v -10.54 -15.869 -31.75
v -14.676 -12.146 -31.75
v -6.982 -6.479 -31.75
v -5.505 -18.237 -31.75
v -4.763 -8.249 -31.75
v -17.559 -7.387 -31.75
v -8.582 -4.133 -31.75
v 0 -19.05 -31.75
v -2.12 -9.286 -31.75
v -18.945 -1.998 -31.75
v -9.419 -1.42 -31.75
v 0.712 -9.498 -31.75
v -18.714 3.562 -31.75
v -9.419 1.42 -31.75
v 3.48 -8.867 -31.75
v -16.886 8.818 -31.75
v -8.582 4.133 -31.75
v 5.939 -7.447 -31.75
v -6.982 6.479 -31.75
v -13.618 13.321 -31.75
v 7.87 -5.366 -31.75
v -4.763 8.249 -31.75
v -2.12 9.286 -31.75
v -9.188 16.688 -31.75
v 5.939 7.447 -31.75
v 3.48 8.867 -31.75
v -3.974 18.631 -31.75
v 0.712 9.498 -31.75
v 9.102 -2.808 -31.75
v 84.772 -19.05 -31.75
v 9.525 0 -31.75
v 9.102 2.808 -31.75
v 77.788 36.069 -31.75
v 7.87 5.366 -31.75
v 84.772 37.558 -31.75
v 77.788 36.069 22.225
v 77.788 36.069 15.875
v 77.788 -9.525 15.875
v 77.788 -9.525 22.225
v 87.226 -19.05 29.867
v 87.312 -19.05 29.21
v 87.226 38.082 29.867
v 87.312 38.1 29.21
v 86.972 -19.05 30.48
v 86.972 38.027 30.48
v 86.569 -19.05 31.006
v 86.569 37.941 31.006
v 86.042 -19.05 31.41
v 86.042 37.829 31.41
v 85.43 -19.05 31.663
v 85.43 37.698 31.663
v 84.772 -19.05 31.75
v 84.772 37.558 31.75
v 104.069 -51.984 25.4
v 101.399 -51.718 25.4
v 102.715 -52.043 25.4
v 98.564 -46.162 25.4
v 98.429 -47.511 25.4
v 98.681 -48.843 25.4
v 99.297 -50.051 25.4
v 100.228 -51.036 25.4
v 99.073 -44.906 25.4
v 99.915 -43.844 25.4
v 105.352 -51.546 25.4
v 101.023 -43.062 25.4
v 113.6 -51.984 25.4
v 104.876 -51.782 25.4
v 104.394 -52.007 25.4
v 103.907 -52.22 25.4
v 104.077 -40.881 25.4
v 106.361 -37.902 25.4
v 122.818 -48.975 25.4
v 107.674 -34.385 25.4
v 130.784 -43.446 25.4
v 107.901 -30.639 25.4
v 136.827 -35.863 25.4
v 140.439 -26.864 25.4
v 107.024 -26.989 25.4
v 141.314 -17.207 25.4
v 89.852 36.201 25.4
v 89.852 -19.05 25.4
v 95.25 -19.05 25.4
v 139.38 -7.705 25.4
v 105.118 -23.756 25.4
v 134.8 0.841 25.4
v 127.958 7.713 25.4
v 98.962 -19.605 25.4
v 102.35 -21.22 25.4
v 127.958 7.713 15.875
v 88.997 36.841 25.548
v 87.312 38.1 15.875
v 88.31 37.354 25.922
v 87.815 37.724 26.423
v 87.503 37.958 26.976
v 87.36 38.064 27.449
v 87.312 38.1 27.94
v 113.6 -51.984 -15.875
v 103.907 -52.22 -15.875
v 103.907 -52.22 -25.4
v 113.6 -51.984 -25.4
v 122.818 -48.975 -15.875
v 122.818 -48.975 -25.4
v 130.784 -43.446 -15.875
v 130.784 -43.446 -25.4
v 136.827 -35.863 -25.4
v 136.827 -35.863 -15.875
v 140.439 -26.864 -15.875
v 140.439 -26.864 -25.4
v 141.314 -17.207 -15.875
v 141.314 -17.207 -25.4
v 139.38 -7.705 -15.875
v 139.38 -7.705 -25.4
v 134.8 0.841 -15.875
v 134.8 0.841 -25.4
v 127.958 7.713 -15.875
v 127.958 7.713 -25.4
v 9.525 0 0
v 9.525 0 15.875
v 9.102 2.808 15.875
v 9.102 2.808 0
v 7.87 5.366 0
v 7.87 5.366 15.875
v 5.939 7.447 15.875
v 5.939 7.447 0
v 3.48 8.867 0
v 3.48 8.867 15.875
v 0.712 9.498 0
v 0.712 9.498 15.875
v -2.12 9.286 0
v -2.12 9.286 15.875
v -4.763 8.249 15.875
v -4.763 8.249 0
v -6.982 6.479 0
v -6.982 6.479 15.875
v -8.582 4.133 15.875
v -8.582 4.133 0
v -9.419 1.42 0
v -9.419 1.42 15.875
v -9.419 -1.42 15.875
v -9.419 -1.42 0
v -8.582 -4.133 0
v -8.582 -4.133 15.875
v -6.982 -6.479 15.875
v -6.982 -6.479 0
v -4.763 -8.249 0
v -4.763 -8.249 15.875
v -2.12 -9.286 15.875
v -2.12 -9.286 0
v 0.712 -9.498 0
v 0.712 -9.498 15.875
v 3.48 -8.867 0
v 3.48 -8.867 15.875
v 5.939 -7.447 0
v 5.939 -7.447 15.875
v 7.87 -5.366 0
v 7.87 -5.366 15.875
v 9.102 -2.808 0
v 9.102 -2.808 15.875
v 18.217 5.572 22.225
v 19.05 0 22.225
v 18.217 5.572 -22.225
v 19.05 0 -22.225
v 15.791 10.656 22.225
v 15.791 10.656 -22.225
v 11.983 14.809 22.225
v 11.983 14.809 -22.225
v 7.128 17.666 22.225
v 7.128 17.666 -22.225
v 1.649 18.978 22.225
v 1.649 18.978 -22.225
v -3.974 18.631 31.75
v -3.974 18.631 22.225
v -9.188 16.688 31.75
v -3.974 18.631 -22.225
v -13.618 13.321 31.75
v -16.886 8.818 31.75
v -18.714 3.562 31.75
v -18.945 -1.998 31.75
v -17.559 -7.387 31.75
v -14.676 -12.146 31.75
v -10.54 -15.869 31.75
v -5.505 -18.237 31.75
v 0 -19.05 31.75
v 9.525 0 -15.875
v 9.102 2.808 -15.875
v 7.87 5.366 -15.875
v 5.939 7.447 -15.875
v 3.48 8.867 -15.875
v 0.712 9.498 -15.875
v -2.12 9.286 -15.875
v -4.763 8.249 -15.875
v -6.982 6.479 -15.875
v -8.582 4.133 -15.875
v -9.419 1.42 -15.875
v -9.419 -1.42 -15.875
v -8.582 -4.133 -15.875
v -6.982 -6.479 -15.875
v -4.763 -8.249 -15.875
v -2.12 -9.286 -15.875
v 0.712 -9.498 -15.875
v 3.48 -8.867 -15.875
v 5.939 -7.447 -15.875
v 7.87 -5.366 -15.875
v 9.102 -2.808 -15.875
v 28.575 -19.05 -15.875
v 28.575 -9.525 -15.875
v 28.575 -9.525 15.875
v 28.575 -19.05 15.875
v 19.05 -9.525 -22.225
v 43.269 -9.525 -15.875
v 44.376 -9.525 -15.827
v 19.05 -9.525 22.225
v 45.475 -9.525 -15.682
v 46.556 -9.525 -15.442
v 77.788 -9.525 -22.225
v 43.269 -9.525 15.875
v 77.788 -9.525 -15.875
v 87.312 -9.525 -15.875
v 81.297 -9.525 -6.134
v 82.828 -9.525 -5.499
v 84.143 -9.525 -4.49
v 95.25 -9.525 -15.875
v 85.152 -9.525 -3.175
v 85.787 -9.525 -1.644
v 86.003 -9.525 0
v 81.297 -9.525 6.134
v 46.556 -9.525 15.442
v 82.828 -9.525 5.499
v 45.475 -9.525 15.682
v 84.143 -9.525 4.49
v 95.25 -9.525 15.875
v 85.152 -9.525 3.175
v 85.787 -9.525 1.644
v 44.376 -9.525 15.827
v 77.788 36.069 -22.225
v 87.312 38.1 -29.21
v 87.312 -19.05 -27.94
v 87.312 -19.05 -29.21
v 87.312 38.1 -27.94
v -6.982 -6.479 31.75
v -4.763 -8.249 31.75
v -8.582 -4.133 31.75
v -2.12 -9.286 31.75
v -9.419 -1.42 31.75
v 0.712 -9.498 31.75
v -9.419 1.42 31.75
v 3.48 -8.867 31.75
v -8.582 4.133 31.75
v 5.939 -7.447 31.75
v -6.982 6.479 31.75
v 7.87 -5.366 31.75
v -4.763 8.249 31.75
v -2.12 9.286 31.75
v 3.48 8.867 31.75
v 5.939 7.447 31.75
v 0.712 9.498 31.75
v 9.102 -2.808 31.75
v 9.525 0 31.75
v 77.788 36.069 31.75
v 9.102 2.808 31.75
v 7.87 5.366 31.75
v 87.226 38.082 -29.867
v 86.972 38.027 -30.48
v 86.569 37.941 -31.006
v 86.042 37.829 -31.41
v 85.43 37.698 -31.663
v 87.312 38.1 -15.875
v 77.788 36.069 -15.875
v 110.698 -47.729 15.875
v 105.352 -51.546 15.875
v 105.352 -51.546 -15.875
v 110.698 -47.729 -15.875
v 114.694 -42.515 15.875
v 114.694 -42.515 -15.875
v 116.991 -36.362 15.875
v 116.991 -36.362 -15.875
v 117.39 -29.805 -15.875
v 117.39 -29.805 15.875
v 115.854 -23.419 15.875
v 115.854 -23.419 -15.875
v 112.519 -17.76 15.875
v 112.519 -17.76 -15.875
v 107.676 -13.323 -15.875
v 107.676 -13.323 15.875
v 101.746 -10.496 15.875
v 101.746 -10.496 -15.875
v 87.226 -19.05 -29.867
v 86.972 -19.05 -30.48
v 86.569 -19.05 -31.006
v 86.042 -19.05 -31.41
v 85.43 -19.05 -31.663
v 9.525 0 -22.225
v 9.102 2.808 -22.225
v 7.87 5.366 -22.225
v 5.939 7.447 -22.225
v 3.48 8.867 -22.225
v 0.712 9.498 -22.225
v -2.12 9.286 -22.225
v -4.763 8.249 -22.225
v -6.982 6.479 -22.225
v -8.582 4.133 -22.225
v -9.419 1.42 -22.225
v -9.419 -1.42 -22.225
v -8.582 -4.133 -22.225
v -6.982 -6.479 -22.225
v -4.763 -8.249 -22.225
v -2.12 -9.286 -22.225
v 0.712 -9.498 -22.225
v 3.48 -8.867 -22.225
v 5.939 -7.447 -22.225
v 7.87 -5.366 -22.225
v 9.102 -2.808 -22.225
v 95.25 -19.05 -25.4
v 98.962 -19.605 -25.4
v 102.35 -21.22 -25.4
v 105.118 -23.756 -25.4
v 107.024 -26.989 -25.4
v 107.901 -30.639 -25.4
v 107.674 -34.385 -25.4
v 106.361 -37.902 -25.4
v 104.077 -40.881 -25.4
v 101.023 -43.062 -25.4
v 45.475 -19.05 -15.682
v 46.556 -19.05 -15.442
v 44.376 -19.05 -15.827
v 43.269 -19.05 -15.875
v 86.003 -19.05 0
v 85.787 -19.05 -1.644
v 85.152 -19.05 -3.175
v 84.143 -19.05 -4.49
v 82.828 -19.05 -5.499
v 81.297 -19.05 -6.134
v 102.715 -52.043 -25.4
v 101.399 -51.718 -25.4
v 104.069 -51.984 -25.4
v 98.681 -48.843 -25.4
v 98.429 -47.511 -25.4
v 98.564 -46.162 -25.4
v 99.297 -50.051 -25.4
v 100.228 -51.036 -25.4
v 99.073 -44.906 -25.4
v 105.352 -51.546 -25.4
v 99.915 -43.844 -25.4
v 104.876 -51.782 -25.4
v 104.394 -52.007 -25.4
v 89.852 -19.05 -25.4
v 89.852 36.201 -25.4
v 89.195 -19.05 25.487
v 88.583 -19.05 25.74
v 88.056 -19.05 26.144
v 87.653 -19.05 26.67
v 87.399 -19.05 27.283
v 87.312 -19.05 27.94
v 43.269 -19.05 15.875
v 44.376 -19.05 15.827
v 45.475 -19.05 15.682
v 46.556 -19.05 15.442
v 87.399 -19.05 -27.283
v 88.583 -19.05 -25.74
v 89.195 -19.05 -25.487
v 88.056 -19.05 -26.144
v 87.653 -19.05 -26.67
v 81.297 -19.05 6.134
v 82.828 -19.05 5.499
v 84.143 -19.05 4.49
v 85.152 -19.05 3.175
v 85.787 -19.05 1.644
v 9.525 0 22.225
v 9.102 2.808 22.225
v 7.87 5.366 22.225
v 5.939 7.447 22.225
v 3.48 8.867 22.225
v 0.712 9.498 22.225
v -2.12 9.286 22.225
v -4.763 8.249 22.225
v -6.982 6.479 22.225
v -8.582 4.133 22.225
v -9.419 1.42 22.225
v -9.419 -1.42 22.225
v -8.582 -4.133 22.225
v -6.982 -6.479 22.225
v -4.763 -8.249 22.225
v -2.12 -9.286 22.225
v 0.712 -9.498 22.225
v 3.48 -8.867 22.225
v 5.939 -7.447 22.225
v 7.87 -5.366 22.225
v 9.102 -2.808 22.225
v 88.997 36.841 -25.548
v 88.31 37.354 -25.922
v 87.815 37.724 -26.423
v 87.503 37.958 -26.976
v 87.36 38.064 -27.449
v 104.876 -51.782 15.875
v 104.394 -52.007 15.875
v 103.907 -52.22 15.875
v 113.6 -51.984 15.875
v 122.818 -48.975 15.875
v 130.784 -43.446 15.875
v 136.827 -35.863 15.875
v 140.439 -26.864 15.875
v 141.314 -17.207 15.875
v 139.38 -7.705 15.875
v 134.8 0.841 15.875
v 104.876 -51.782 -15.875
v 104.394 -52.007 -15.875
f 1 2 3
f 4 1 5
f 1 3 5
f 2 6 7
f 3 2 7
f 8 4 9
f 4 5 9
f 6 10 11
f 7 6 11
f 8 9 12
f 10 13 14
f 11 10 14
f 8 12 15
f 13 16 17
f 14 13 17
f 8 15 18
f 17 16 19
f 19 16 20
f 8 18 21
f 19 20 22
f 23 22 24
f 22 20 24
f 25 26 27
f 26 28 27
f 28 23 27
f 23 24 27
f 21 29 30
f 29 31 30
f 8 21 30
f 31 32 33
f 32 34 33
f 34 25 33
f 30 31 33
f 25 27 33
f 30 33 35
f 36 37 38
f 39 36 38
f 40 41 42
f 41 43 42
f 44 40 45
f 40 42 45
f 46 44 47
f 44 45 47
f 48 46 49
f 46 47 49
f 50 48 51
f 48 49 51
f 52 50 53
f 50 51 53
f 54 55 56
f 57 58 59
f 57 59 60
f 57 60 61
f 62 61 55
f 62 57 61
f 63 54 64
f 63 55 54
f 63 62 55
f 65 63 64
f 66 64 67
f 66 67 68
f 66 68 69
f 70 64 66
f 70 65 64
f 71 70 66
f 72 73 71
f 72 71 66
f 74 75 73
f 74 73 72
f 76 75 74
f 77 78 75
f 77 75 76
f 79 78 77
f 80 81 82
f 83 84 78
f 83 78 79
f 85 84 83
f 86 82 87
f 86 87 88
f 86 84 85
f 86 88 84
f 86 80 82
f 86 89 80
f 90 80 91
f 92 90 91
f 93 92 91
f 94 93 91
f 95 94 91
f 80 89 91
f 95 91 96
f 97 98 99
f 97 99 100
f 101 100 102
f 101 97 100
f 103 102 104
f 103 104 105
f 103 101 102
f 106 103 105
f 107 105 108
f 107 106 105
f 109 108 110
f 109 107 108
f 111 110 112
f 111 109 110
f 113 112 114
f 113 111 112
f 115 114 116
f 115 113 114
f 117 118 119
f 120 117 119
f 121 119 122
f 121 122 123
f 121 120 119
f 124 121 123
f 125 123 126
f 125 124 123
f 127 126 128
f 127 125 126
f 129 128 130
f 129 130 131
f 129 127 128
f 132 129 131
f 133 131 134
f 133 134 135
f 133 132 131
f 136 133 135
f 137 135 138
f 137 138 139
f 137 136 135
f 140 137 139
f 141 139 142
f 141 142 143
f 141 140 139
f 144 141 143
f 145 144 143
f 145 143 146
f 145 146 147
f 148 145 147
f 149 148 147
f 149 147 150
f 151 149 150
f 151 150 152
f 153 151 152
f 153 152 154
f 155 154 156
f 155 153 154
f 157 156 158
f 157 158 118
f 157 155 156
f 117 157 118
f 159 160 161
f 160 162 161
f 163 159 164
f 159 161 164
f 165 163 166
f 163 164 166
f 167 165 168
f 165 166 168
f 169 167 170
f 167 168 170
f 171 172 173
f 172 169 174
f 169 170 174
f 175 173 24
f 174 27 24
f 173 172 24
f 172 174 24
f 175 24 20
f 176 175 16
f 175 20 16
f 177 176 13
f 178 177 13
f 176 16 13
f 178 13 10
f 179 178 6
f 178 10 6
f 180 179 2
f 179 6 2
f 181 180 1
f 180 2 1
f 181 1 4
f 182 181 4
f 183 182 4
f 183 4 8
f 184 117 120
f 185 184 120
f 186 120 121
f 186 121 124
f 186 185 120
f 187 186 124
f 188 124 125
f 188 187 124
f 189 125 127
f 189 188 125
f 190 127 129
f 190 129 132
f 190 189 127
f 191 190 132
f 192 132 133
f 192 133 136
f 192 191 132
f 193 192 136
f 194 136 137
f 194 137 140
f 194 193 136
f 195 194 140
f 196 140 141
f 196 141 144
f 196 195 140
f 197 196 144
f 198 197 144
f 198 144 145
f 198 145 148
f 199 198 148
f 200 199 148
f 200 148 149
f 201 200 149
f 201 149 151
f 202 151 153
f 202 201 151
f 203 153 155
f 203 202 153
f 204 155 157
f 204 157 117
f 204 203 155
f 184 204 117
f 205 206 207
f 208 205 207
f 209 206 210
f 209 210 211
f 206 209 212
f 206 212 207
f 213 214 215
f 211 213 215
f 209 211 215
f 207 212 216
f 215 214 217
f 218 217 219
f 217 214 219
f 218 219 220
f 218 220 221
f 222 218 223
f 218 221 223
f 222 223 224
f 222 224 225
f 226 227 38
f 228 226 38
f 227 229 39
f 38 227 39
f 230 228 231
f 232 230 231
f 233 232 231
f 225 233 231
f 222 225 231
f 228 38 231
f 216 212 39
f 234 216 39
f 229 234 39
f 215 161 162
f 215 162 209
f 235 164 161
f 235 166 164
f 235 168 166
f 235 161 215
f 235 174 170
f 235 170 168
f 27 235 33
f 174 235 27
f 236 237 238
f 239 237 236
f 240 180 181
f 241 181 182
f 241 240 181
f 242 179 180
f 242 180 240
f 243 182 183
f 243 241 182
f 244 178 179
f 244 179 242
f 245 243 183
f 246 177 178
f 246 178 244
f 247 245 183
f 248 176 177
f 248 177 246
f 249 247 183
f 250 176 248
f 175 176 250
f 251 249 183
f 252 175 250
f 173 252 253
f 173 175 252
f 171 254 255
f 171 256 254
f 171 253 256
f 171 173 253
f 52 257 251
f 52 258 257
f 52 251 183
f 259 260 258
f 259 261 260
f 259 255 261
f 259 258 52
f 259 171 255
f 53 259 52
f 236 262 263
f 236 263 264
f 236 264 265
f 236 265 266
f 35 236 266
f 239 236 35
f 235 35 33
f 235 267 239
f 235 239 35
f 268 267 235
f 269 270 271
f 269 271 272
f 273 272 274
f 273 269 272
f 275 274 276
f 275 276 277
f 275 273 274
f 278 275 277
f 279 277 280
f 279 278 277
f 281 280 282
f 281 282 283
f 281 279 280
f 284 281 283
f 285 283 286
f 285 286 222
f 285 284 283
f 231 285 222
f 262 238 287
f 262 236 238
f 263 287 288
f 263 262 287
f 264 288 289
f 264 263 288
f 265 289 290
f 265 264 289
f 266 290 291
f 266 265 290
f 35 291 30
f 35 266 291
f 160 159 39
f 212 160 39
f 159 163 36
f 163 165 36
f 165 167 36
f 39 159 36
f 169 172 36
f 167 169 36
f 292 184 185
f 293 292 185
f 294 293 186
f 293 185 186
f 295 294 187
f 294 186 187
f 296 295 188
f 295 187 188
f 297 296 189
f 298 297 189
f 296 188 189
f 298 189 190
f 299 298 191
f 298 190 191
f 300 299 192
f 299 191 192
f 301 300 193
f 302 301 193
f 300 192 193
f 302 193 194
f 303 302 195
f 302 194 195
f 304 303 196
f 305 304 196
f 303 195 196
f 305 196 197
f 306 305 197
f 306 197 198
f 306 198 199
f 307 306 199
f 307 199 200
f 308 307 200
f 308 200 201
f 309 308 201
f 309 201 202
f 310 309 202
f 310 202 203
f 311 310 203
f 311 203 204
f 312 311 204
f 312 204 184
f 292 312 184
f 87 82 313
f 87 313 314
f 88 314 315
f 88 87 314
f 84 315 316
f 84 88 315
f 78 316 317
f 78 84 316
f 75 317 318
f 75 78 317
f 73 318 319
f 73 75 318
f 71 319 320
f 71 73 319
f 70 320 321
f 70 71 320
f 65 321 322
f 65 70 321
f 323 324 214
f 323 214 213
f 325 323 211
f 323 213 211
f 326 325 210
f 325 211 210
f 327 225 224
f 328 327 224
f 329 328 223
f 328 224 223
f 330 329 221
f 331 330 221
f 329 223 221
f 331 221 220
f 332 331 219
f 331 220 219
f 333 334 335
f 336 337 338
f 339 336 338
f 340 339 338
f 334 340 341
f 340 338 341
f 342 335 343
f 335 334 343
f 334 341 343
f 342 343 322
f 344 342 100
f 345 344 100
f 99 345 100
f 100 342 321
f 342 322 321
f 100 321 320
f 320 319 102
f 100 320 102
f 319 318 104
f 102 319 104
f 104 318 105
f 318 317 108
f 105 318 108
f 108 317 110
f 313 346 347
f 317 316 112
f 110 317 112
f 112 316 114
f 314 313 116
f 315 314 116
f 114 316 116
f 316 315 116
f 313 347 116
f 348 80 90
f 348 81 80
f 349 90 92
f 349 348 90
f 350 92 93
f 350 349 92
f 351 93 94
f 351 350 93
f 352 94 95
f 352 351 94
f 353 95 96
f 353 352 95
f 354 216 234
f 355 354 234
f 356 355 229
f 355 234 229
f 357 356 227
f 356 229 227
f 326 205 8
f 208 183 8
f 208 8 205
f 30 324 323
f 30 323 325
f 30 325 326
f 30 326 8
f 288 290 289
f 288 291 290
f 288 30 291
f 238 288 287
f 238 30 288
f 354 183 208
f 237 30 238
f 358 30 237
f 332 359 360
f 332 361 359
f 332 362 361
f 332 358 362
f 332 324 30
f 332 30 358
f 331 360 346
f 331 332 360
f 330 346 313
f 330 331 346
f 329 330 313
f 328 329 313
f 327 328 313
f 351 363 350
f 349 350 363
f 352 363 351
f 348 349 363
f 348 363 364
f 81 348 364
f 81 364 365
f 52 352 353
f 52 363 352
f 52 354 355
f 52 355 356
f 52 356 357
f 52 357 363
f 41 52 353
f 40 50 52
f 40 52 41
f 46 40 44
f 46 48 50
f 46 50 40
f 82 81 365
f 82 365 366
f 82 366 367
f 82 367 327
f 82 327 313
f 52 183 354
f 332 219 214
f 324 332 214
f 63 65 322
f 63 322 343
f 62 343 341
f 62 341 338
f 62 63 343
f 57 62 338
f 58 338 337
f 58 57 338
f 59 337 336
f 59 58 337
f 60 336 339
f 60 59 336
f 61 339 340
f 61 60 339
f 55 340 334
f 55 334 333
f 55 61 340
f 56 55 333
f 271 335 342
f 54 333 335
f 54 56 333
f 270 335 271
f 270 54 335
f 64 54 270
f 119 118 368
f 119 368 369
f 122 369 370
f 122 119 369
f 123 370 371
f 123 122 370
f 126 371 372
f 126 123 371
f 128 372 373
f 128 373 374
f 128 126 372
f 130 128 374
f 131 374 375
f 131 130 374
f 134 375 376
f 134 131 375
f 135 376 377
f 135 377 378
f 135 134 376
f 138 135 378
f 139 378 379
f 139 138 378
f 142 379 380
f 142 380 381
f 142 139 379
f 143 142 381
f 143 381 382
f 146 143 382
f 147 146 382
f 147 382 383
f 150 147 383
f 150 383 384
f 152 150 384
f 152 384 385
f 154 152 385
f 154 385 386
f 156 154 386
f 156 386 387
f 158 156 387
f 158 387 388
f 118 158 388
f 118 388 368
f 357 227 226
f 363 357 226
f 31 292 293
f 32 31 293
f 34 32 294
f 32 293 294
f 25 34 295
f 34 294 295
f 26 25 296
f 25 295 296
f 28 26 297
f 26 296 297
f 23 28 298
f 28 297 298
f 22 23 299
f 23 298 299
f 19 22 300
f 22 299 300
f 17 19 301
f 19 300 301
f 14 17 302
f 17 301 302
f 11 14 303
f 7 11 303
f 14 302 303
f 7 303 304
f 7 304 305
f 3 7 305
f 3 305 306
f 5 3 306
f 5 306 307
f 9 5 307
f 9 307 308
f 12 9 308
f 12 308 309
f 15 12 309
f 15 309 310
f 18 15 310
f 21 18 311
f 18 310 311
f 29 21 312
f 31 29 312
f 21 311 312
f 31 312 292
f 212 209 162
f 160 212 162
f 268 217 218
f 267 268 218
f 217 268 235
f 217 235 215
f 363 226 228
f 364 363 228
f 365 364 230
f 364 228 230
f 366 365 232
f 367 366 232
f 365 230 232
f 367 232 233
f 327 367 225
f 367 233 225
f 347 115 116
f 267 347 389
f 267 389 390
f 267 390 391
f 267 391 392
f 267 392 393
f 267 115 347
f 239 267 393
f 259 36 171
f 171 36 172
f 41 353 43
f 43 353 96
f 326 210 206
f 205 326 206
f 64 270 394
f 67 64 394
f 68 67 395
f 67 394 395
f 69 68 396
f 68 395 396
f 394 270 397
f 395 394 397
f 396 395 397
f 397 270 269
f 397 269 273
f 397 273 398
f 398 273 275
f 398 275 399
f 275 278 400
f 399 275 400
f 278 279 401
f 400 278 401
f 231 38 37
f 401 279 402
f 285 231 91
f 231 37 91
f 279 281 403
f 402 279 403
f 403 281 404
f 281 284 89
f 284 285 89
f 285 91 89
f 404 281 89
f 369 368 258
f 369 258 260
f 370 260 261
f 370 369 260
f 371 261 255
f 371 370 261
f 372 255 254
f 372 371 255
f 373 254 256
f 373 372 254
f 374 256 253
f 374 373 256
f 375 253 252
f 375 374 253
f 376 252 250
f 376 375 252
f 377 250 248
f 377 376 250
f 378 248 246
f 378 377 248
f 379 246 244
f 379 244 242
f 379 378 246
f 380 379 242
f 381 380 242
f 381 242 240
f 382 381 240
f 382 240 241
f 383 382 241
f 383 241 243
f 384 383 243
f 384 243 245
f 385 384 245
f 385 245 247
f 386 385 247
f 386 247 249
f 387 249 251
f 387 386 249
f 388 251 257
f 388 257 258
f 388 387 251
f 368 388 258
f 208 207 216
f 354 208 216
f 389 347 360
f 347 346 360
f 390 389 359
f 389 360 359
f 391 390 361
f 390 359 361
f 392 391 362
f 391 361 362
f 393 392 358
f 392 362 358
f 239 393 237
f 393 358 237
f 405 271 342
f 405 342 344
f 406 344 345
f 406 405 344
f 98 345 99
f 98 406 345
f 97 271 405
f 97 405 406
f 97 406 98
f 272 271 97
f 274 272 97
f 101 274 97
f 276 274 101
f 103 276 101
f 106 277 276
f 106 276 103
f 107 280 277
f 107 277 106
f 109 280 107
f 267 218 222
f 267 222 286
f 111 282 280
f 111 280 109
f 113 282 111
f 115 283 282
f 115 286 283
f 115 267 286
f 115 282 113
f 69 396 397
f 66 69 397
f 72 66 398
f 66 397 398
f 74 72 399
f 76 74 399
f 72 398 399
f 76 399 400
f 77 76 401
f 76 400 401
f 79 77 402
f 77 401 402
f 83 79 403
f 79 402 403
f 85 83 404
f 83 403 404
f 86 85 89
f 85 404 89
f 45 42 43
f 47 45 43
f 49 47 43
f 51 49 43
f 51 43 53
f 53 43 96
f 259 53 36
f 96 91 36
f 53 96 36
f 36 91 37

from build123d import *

# Parameters (mm, degrees)
SKETCH1_R            = 9.525
BOSS_EXTRUDE1_DEPTH  = 15.875
SKETCH1_3_R          = 9.525
BOSS_EXTRUDE2_DEPTH  = 22.225
BOSS_EXTRUDE6_START  = 22.225
SKETCH1_7_R          = 9.525
BOSS_EXTRUDE6_DEPTH  = 9.525
BOSS_EXTRUDE8_START  = 15.875
BOSS_EXTRUDE8_DEPTH  = 9.525
BOSS_EXTRUDE10_START = 25.4
BOSS_EXTRUDE10_DEPTH = 9.525
CUT_EXTRUDE1_DEPTH   = 153.513472698
FILLET1_R            = 2.54


with BuildPart() as part:
    # Sketch1 → Boss-Extrude1 (new, symmetric)
    with BuildSketch(Plane.XY):
        with BuildLine():
            Line((0, -19.05), (95.25, -19.05))
            ThreePointArc((95.25, -19.05), (107.598173959, -28.781397654), (101.022727273, -43.062188994))
            ThreePointArc((101.022727273, -43.062188994), (98.945429127, -49.469032594), (105.352272727, -51.546330739))
            ThreePointArc((105.352272727, -51.546330739), (116.859304428, -26.554945895), (95.25, -9.525))
            Line((95.25, -9.525), (19.05, -9.525))
            Line((19.05, -9.525), (19.05, 0))
            ThreePointArc((19.05, 0), (-13.470384182, 13.470384182), (0, -19.05))
        make_face()
        Circle(SKETCH1_R, mode=Mode.SUBTRACT)
    extrude(amount=BOSS_EXTRUDE1_DEPTH, both=True)

    # Sketch1<3> → Boss-Extrude2 (add, symmetric)
    with BuildSketch(Plane.XY):
        with BuildLine():
            Line((0, -19.05), (77.7875, -19.05))
            Line((77.7875, -19.05), (77.7875, -9.525))
            Line((77.7875, -9.525), (19.05, -9.525))
            Line((19.05, -9.525), (19.05, 0))
            ThreePointArc((19.05, 0), (-13.470384182, 13.470384182), (0, -19.05))
        make_face()
        Circle(SKETCH1_3_R, mode=Mode.SUBTRACT)
    extrude(amount=BOSS_EXTRUDE2_DEPTH, both=True)

    # Sketch1<7> → Boss-Extrude6 (add)
    with BuildSketch(Plane.XY.offset(BOSS_EXTRUDE6_START)):
        with BuildLine():
            ThreePointArc((-3.973521059, 18.63098576), (-18.944956832, -1.997776423), (0, -19.05))
            Line((0, -19.05), (87.3125, -19.05))
            Line((87.3125, -19.05), (87.3125, 38.1))
            Line((87.3125, 38.1), (-3.973521059, 18.63098576))
        make_face()
        Circle(SKETCH1_7_R, mode=Mode.SUBTRACT)
    boss_extrude6 = extrude(amount=BOSS_EXTRUDE6_DEPTH)

    # Sketch1<9> → Boss-Extrude8 (add)
    with BuildSketch(Plane.XY.offset(BOSS_EXTRUDE8_START)):
        Polygon((77.7875, -19.05), (87.3125, -19.05), (87.3125, 38.1), (77.7875, 36.068556867), align=None)
    boss_extrude8 = extrude(amount=BOSS_EXTRUDE8_DEPTH)

    # Sketch1<10> → Boss-Extrude10 (add)
    with BuildSketch(Plane.XY.offset(BOSS_EXTRUDE10_START)):
        with BuildLine():
            Line((87.3125, -19.05), (95.25, -19.05))
            ThreePointArc((95.25, -19.05), (107.598173959, -28.781397654), (101.022727273, -43.062188994))
            ThreePointArc((101.022727273, -43.062188994), (98.945429127, -49.469032594), (105.352272727, -51.546330739))
            ThreePointArc((105.352272727, -51.546330739), (104.635512697, -51.896036246), (103.906667348, -52.219800571))
            ThreePointArc((103.906667348, -52.219800571), (138.961341357, -31.495116154), (127.958197617, 7.712963905))
            Line((127.958197617, 7.712963905), (87.3125, 38.1))
            Line((87.3125, 38.1), (87.3125, -19.05))
        make_face()
    boss_extrude10 = extrude(amount=-BOSS_EXTRUDE10_DEPTH)

    # Mirror1: Boss-Extrude6, Boss-Extrude8, Boss-Extrude10 across plane
    add(boss_extrude6.mirror(Plane.XY))
    add(boss_extrude8.mirror(Plane.XY))
    add(boss_extrude10.mirror(Plane.XY))

    # Sketch2 → Cut-Extrude1 (cut, through all)
    with BuildSketch(Plane(origin=(0, -9.525, 0), x_dir=(1, 0, 0), z_dir=(0, 1, 0))):
        with BuildLine():
            Line((28.575, -15.875), (43.269345299, -15.875))
            ThreePointArc((43.269345299, -15.875), (44.92702794, -15.766349739), (46.556347172, -15.442257994))
            Line((46.556347172, -15.442257994), (81.296623537, -6.133628997))
            ThreePointArc((81.296623537, -6.133628997), (86.003122601, 0), (81.296623537, 6.133628997))
            Line((81.296623537, 6.133628997), (46.556347172, 15.442257994))
            ThreePointArc((46.556347172, 15.442257994), (44.92702794, 15.766349739), (43.269345299, 15.875))
            Line((43.269345299, 15.875), (28.575, 15.875))
            Line((28.575, 15.875), (28.575, -15.875))
        make_face()
    extrude(amount=-CUT_EXTRUDE1_DEPTH, mode=Mode.SUBTRACT)

    # Fillet1
    fillet1_edges = [part.edges().sort_by_distance(p)[0] for p in [
        (87.3125, 9.525, -31.75),
        (87.3125, 9.525, -25.4),
        (87.3125, 9.525, 31.75),
        (87.3125, 9.525, 25.4),
    ]]
    fillet(fillet1_edges, radius=FILLET1_R)


solid = part.part
